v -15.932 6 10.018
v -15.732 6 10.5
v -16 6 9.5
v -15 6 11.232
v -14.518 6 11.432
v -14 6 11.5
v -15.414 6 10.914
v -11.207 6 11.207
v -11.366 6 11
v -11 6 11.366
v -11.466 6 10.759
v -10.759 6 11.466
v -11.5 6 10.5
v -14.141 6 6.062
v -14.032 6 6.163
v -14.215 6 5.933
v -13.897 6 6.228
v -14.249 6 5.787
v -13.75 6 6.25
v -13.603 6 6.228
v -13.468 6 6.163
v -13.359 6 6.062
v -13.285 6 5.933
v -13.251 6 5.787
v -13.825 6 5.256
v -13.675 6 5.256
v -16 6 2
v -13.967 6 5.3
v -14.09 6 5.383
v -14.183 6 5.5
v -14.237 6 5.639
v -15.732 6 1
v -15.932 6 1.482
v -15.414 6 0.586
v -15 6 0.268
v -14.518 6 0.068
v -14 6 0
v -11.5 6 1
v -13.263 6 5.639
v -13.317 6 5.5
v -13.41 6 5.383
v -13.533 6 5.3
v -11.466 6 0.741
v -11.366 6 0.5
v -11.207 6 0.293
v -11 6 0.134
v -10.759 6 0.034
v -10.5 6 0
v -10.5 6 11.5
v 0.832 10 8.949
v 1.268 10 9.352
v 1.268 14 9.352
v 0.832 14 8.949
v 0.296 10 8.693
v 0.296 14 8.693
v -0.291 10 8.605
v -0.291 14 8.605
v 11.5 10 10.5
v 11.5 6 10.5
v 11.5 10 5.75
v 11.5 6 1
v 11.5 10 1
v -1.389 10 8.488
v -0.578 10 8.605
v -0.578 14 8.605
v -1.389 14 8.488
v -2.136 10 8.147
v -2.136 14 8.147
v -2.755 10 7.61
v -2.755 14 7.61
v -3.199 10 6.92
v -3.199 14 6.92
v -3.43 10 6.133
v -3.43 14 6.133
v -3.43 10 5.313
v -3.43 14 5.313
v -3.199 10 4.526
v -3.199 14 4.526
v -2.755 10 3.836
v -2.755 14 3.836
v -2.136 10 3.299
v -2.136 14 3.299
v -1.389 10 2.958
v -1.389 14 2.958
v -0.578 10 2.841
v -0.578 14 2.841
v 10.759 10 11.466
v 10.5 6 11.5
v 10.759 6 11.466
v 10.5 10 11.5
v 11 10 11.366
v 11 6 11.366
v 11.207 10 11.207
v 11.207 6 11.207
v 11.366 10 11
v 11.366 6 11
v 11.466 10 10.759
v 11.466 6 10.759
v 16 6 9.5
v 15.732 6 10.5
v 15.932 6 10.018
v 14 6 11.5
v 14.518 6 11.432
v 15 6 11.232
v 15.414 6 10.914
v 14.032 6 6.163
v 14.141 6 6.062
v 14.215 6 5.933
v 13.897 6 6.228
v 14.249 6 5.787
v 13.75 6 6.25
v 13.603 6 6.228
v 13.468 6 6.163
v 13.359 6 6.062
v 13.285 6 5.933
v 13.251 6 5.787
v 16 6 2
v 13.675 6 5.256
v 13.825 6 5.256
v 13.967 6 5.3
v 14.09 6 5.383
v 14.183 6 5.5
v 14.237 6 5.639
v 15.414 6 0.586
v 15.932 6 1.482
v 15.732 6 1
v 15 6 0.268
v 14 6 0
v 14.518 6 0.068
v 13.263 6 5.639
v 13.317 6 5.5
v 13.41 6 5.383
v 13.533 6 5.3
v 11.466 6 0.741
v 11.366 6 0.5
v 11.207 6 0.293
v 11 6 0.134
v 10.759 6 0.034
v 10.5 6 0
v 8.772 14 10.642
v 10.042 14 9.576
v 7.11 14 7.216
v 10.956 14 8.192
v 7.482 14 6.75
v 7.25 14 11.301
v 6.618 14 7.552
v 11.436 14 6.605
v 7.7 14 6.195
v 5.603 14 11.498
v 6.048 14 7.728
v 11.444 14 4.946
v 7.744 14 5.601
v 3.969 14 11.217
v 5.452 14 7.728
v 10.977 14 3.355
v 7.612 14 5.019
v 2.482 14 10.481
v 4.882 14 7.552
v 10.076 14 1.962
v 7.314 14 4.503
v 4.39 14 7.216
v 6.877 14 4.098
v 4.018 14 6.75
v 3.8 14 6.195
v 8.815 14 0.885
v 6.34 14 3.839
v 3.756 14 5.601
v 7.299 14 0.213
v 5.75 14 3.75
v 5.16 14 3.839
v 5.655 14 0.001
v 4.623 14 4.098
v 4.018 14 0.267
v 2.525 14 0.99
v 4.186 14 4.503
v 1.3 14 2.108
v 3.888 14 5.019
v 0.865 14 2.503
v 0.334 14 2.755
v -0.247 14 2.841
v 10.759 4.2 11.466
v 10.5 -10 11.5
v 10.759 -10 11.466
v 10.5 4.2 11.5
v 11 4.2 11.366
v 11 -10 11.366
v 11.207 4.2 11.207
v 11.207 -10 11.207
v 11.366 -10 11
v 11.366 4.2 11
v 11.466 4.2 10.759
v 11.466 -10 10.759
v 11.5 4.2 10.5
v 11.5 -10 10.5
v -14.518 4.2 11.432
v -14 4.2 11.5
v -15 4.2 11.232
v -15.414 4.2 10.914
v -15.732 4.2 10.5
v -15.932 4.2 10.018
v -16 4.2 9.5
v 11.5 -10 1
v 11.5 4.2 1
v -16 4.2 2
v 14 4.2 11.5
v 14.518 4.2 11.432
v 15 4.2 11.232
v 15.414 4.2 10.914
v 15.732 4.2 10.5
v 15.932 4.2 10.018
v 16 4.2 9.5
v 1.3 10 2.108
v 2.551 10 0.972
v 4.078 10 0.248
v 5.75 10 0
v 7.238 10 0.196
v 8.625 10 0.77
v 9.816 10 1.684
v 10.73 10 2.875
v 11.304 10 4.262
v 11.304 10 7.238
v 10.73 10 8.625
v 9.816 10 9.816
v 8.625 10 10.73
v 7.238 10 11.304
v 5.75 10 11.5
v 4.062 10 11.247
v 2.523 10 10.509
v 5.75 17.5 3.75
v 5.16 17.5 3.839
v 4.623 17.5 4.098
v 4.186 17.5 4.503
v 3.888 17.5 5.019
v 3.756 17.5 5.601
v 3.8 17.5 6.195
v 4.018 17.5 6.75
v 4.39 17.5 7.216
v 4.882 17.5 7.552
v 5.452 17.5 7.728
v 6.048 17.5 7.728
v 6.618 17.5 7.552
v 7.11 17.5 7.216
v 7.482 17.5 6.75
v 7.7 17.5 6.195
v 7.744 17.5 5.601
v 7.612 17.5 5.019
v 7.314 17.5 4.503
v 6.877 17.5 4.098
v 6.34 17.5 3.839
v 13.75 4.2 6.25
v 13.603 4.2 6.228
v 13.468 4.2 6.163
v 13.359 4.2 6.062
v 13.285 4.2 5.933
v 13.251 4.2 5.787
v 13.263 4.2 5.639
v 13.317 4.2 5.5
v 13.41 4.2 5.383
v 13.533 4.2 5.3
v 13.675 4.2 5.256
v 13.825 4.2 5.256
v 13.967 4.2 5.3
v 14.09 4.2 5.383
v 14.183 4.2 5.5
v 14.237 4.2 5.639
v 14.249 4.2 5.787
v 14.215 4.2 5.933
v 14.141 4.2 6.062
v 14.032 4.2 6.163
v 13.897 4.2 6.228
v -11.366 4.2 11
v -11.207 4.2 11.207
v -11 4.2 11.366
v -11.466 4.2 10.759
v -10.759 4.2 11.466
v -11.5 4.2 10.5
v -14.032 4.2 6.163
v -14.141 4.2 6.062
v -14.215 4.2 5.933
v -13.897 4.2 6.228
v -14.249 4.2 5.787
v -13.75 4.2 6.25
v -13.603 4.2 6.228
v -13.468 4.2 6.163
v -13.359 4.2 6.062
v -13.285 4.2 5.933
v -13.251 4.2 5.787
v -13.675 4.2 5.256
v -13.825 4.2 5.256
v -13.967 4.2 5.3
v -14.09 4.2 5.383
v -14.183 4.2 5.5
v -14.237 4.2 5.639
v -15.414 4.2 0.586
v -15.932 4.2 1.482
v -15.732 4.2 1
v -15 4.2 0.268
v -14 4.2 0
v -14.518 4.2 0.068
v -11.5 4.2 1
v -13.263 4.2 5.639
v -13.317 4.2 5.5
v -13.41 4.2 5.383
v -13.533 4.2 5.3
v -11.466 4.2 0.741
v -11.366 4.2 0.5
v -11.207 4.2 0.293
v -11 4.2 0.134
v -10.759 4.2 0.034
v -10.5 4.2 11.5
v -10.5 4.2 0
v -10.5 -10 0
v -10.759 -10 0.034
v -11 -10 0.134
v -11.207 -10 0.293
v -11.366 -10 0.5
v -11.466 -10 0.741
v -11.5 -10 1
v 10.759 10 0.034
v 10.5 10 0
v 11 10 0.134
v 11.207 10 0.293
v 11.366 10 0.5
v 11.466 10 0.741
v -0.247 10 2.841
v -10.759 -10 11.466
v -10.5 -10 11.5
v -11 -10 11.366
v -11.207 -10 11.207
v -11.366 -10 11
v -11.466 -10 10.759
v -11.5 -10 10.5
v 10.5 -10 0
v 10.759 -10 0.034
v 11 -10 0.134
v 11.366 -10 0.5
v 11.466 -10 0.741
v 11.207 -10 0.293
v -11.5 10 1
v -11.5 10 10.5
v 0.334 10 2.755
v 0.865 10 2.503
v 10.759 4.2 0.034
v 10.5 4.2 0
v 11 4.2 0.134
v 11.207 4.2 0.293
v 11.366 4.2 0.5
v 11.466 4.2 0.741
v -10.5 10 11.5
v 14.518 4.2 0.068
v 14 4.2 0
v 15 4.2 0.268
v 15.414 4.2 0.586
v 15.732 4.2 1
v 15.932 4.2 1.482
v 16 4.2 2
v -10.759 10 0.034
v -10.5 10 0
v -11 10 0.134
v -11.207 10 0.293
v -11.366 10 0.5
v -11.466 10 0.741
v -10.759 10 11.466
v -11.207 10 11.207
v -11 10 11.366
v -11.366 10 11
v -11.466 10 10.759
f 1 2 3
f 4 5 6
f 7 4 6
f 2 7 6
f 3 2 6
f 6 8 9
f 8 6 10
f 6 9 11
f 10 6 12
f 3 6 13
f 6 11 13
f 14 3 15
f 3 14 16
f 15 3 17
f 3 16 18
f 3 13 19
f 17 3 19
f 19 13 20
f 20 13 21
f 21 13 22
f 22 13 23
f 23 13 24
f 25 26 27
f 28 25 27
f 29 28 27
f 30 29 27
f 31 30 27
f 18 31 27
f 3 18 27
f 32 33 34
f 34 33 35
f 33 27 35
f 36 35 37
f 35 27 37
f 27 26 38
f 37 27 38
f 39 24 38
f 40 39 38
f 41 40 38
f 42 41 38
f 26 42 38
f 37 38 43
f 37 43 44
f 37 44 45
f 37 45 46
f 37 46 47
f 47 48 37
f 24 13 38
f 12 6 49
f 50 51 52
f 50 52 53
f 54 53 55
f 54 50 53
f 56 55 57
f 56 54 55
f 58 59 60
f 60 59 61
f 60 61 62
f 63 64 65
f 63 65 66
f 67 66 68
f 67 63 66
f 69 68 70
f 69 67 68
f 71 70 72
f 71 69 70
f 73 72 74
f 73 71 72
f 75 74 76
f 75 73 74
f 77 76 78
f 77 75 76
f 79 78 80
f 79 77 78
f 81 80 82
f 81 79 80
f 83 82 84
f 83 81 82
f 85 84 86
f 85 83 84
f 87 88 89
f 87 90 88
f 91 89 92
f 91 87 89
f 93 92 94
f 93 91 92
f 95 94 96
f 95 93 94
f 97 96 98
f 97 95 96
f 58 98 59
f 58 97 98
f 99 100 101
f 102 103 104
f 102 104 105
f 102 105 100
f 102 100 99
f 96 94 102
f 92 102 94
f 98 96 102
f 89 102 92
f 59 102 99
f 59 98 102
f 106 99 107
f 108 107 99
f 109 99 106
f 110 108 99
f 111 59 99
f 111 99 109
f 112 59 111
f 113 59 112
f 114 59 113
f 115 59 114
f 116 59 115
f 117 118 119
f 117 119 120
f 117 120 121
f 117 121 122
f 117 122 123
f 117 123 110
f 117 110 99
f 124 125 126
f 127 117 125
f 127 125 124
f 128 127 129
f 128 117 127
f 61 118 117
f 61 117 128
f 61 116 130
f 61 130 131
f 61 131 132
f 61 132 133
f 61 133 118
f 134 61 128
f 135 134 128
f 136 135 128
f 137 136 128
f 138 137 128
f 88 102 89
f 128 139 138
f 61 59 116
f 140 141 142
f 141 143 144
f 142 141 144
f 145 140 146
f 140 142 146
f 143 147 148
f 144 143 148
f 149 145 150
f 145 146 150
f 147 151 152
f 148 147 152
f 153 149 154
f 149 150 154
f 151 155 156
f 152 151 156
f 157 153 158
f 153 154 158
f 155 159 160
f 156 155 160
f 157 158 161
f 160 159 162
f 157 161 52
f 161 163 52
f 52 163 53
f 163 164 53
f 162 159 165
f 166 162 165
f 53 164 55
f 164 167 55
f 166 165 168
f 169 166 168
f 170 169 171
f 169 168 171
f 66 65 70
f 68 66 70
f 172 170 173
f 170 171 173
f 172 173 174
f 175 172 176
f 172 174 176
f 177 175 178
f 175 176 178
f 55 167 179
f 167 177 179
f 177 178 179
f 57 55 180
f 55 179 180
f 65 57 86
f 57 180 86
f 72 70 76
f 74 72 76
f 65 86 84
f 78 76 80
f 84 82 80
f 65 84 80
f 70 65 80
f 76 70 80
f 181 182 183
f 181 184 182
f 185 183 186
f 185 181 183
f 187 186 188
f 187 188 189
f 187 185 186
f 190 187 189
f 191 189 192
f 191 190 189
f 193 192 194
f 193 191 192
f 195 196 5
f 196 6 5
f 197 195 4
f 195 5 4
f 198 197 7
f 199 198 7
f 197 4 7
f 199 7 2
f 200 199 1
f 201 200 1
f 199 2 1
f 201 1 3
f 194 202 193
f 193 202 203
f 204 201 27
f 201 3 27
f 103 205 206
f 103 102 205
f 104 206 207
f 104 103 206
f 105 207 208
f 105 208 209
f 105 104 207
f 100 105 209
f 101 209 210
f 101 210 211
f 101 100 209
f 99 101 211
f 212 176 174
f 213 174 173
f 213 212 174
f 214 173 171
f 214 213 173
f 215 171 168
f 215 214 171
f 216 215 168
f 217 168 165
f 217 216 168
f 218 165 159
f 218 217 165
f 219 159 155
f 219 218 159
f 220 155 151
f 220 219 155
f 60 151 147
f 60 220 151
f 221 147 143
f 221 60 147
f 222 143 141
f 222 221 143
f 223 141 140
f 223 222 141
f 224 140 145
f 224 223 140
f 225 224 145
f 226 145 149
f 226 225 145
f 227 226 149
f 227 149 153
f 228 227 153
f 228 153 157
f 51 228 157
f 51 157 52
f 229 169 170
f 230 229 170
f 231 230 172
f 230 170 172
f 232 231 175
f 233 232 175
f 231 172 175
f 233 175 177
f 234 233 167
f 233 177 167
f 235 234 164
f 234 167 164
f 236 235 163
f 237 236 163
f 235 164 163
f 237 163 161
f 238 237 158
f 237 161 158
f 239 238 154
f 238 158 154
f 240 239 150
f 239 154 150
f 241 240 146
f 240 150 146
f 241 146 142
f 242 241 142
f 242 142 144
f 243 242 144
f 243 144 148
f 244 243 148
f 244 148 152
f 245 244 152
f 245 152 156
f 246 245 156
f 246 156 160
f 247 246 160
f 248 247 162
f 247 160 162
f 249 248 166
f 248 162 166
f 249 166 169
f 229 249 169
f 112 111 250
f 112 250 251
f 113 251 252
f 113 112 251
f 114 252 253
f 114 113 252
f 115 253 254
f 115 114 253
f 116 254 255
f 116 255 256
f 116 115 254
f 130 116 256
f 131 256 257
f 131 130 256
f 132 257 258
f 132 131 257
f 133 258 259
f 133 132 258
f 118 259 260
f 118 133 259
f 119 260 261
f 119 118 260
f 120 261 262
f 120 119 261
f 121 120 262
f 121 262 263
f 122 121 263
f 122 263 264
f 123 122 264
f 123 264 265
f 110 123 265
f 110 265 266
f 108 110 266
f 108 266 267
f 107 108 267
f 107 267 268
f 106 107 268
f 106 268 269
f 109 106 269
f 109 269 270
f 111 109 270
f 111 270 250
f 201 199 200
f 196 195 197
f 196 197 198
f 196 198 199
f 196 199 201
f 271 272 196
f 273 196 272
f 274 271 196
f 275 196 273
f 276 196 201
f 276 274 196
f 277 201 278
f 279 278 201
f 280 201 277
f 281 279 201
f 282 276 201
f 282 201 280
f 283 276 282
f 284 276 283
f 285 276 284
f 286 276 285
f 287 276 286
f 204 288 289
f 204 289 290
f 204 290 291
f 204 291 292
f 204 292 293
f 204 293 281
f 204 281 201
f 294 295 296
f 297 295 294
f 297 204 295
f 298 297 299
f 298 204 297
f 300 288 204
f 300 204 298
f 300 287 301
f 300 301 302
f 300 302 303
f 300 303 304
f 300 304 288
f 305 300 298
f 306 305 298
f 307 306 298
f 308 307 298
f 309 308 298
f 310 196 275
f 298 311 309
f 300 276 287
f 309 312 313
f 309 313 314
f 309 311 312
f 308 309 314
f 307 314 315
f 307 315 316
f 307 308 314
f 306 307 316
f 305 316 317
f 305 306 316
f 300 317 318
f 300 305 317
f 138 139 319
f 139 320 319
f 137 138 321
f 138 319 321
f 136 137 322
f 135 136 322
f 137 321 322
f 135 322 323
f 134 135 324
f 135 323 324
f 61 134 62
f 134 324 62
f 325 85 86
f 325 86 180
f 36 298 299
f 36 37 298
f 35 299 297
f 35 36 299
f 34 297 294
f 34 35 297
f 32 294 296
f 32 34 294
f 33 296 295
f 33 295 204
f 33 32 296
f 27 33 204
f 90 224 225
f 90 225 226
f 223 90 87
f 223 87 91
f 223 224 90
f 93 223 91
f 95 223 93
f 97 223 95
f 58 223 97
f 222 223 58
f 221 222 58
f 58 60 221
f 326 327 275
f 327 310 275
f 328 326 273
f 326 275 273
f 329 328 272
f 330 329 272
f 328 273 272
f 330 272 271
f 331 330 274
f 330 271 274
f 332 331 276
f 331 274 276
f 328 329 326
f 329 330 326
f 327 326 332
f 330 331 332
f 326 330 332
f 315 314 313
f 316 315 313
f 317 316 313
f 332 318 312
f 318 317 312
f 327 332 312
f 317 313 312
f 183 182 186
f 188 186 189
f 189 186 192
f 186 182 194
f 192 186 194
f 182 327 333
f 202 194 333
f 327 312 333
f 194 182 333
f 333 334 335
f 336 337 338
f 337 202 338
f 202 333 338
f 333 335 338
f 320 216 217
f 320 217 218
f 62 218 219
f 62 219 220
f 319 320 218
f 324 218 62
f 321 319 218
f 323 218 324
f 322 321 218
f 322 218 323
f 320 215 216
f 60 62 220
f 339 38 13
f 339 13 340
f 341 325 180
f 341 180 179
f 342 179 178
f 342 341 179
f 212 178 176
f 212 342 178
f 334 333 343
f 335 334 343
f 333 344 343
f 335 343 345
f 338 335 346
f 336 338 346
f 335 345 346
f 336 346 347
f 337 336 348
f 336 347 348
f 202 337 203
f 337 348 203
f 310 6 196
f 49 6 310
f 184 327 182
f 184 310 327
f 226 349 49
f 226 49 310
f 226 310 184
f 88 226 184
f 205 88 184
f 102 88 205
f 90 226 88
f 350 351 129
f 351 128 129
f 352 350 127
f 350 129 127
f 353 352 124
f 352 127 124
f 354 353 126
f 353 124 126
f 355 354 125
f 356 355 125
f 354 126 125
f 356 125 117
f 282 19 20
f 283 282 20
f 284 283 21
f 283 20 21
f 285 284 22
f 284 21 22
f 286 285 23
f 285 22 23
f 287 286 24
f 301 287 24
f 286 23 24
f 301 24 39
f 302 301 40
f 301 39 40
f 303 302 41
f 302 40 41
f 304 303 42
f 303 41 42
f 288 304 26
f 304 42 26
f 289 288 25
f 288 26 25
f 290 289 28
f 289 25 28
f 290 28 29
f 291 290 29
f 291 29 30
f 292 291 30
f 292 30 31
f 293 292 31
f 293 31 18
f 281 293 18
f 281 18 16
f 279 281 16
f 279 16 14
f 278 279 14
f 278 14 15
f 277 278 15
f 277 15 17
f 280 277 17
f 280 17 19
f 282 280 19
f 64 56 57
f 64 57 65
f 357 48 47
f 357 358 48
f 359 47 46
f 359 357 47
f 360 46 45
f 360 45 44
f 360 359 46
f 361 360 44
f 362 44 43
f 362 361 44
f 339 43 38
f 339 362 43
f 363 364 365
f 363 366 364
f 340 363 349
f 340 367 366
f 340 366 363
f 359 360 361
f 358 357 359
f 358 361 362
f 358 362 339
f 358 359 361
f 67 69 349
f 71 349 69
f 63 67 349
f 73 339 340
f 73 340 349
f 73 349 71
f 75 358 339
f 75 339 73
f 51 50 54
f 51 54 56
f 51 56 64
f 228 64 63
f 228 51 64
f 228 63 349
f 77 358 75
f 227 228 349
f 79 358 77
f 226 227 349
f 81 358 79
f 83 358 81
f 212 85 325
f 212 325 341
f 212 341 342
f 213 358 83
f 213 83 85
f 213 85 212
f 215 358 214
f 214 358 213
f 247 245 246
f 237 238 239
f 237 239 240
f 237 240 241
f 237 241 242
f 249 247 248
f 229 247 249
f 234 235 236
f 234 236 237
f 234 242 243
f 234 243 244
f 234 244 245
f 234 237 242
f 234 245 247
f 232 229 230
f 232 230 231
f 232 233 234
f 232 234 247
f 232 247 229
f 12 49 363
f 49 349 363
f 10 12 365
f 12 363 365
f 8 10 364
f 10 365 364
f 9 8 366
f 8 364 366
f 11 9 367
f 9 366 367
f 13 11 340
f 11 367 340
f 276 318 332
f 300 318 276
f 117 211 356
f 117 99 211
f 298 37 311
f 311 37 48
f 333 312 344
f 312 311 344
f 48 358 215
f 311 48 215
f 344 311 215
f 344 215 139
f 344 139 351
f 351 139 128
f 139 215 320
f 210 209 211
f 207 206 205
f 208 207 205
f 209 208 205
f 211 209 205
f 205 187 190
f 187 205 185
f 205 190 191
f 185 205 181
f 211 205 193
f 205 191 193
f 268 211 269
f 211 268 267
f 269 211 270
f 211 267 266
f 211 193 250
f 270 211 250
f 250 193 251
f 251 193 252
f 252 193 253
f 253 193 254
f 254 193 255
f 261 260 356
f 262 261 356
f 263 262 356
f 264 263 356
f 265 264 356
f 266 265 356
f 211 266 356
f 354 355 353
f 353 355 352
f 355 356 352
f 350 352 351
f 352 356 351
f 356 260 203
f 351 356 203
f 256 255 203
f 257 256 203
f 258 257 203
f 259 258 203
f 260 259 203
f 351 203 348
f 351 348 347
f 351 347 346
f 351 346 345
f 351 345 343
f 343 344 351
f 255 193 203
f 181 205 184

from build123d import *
from OCP.BRepFilletAPI import BRepFilletAPI_MakeFillet

# Parameters (mm, degrees)
ESQUISSE1_W             = 23
ESQUISSE1_H             = 20
BOSS_EXTRU_1_DEPTH      = 11.5
ESQUISSE2_W             = 11.5
ESQUISSE2_H             = 1.8
BOSS_EXTRU_2_DEPTH      = 4.5
BOSS_EXTRU_3_DEPTH      = 4
ENL_V_MAT_EXTRU_1_REACH = 27.382
ESQUISSE4_R             = 0.5
CONG_1_R1               = 1
CONG_1_R2               = 2
ESQUISSE5_R             = 2
BOSS_EXTRU_4_DEPTH      = 3.5


with BuildPart() as part:
    # Esquisse1 → Boss.-Extru.1 (new body)
    with BuildSketch(Plane.XY):
        Rectangle(ESQUISSE1_W, ESQUISSE1_H)
    extrude(amount=BOSS_EXTRU_1_DEPTH)

    # Esquisse2 → Boss.-Extru.2 (add)
    with BuildSketch(Plane(origin=(11.5, 0, 0), x_dir=(0, 0, -1), z_dir=(1, 0, 0))):
        with Locations((-5.75, 5.1)):
            Rectangle(ESQUISSE2_W, ESQUISSE2_H)
    boss_extru_2 = extrude(amount=BOSS_EXTRU_2_DEPTH)

    # Symétrie1: Boss.-Extru.2 across plane
    add(boss_extru_2.mirror(Plane(origin=(0, 0, 0), x_dir=(0, 0, 1), z_dir=(1, 0, 0))))

    # Esquisse3 → Boss.-Extru.3 (add)
    with BuildSketch(Plane(origin=(0, 10, 0), x_dir=(1, 0, 0), z_dir=(0, 1, 0))):
        with BuildLine():
            Line((-0.290992678, -8.604781917), (-0.577609195, -8.604781917))
            ThreePointArc((-0.577609195, -8.604781917), (-3.459311015, -5.723080096), (-0.577609195, -2.841378276))
            Line((-0.577609195, -2.841378276), (-0.247327135, -2.841378276))
            ThreePointArc((-0.247327135, -2.841378276), (0.608978248, -2.648791092), (1.30037019, -2.108119366))
            ThreePointArc((1.30037019, -2.108119366), (11.499942495, -5.775715864), (1.267973174, -9.351934971))
            ThreePointArc((1.267973174, -9.351934971), (0.573387477, -8.801216851), (-0.290992678, -8.604781917))
        make_face()
    extrude(amount=BOSS_EXTRU_3_DEPTH)

    # Esquisse4 → Enlèv. mat.-Extru.1 (cut, up to next)
    with BuildSketch(Plane(origin=(0, 6, 0), x_dir=(1, 0, 0), z_dir=(0, 1, 0)), mode=Mode.PRIVATE) as enl_v_mat_extru_1_sk1:
        with Locations((-13.75, -5.75)):
            Circle(ESQUISSE4_R)
    enl_v_mat_extru_1_tool1 = extrude(enl_v_mat_extru_1_sk1.sketch, amount=-ENL_V_MAT_EXTRU_1_REACH, mode=Mode.PRIVATE) & part.part
    enl_v_mat_extru_1 = enl_v_mat_extru_1_tool1.solids().sort_by_distance((-13.75, 6, 5.75))[0]
    add(enl_v_mat_extru_1, mode=Mode.SUBTRACT)

    # Symétrie2: Enlèv. mat.-Extru.1 across plane
    add(enl_v_mat_extru_1.mirror(Plane(origin=(0, 0, 0), x_dir=(0, 0, 1), z_dir=(1, 0, 0))), mode=Mode.SUBTRACT)

    # Congé1: one fillet with a radius per group of edges: ONE call of the kernel's fillet builder (fillet() takes one radius for all edges)
    cong_1_edges_1 = [part.edges().sort_by_distance(p)[0] for p in [
        (-11.5, -2.9, 11.5),
        (-11.5, -2.9, 0),
        (-11.5, 8, 0),
        (-11.5, 8, 11.5),
        (11.5, 8, 11.5),
        (11.5, 8, 0),
        (11.5, -2.9, 11.5),
        (11.5, -2.9, 0),
    ]]
    cong_1_edges_2 = [part.edges().sort_by_distance(p)[0] for p in [
        (-16, 5.1, 11.5),
        (-16, 5.1, 0),
        (16, 5.1, 0),
        (16, 5.1, 11.5),
    ]]
    cong_1 = BRepFilletAPI_MakeFillet(part.part.solid().wrapped)
    for e in cong_1_edges_1:
        cong_1.Add(CONG_1_R1, e.wrapped)
    for e in cong_1_edges_2:
        cong_1.Add(CONG_1_R2, e.wrapped)
    add(Compound.cast(cong_1.Shape()), mode=Mode.REPLACE)

    # Esquisse5 → Boss.-Extru.4 (add)
    with BuildSketch(Plane(origin=(0, 14, 0), x_dir=(1, 0, 0), z_dir=(0, 1, 0))):
        with Locations((5.75, -5.75)):
            Circle(ESQUISSE5_R)
    extrude(amount=BOSS_EXTRU_4_DEPTH)


solid = part.part
